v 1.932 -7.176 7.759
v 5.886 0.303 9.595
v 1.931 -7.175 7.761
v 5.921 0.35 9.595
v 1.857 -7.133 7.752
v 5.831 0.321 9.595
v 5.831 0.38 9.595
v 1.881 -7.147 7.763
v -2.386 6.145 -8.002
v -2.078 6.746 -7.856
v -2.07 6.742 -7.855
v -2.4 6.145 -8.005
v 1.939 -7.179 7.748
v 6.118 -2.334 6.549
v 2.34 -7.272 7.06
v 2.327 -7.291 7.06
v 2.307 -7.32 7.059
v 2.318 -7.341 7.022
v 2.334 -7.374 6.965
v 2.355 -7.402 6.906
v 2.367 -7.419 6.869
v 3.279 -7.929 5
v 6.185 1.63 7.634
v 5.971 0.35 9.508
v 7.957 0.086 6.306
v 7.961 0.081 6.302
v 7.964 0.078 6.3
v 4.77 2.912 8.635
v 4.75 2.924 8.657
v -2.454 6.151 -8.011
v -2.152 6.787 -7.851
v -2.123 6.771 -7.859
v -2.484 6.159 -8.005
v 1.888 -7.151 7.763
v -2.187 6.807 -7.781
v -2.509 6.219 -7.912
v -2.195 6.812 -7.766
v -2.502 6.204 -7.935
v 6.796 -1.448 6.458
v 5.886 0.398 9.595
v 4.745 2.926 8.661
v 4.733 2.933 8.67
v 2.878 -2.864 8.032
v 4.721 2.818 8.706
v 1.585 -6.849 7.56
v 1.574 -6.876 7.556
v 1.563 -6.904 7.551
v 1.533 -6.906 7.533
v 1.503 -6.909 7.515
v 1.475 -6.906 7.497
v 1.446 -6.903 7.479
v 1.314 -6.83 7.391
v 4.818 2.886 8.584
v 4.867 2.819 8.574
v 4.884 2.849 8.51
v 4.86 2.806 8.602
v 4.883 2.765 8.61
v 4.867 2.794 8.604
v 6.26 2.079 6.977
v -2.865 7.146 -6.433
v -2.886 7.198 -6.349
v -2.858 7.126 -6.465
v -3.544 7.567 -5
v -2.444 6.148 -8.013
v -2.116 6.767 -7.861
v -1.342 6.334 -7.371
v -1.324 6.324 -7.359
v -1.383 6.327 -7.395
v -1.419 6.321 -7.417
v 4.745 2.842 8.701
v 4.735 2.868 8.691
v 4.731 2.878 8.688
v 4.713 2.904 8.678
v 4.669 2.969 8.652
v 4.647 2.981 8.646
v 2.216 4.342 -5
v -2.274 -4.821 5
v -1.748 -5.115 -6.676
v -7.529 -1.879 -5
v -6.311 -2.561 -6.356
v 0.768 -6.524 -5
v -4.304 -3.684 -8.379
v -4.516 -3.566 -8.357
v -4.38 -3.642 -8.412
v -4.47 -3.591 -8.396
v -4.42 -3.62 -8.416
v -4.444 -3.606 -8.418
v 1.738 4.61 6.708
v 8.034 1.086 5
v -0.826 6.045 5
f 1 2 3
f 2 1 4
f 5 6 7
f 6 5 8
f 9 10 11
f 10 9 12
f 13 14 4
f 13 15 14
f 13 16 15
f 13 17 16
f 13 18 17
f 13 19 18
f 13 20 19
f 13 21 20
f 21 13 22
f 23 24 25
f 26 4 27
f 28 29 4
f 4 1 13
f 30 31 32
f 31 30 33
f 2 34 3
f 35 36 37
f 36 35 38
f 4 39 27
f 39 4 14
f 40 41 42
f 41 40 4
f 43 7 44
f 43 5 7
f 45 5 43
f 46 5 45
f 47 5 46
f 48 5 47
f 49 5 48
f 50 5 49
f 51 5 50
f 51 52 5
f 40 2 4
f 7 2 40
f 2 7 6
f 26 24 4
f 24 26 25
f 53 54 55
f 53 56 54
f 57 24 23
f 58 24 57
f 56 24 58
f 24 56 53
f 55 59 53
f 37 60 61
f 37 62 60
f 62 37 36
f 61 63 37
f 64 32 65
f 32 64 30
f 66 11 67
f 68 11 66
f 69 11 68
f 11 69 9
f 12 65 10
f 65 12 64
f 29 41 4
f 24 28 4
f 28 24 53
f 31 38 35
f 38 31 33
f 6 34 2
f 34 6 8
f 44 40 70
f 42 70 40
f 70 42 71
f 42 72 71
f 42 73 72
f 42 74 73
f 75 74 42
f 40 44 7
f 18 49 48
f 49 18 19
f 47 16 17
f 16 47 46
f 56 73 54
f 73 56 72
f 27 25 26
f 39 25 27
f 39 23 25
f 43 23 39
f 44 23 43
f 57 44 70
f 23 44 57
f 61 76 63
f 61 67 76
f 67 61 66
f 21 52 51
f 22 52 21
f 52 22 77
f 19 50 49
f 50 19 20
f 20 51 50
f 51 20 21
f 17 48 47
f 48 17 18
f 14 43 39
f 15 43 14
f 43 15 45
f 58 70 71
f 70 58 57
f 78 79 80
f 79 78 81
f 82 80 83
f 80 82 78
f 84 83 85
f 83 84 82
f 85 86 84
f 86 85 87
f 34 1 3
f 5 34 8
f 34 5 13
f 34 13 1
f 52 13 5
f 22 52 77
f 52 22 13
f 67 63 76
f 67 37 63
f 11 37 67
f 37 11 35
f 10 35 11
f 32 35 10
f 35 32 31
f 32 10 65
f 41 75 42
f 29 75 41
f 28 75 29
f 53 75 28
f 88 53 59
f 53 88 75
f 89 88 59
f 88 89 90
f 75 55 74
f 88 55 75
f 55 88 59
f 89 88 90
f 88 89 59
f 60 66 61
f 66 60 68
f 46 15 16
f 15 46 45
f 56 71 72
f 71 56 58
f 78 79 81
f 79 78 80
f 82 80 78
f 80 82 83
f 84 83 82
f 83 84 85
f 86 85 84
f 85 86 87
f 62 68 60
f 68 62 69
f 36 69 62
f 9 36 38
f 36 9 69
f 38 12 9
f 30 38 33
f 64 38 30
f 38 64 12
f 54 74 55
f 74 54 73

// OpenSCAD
// Auto-generated OpenSCAD file

    inner_points = 10*[[0.5272841921394986, -0.8941494324725834, -0.5000000000002047], [1.0157495787801158, -0.02156616077066012, -0.5000000000002183], [-0.9840743682826907, -0.048102565072366016, 0.5000000000002183], [-0.49560898164207345, 0.8244807066295572, 0.5000000000002047], [-0.22839508807181572, -0.47112599877236716, -0.9999999999999931], [0.5272841921397184, -0.8941494324726909, 0.4999999999997952], [0.2600702985688014, 0.401457272929556, -1.0000000000000067], [1.0157495787803354, -0.021566160770767534, 0.49999999999978156], [-0.9840743682829104, -0.0481025650722586, -0.49999999999978156], [-0.22839508807137623, -0.4711259987725822, 1.0000000000000067], [-0.4956089816422933, 0.8244807066296647, -0.4999999999997952], [0.26007029856924085, 0.4014572729293411, 0.9999999999999931], [-0.6705068091423759, 0.3493759475629592, -1.3623724356956024]];

    outer_points = 10*[[-0.5871016774818598, -0.035032029076049194, -0.9508335170979203], [-1.1127273597817333, 0.035032029076049194, -0.10300766831643143], [1.1127273597817333, -0.035032029076049194, 0.10300766831643143], [0.5871016774818598, 0.035032029076049194, 0.9508335170979203], [-0.1941165129402417, -0.8989291704166398, -0.6358027414048893], [-0.1301723233916815, 0.8288651122645414, -0.7389437000837753], [-0.7197421952401151, -0.8288651122645414, 0.21202310737659946], [-0.6557980056915549, 0.8989291704166398, 0.10888214869771351], [0.6557980056915549, -0.8989291704166398, -0.10888214869771351], [0.7197421952401151, 0.8288651122645414, -0.21202310737659946], [0.1301723233916815, -0.8288651122645414, 0.7389437000837753], [0.1941165129402417, 0.8989291704166398, 0.6358027414048893], [-0.05807720084257707, -1.5692662035184195, 0.09367759939690216]];

    // Convex hull for inner set (I)
    module inner_hull() {
        hull() {
            for (p = inner_points) {
                translate(p) sphere(r=0.1);
            }
        }
    }

    // Convex hull for outer set (O) minus inner hull (O \ I)
    module outer_minus_inner() {
        difference() {
            hull() {
                for (p = outer_points) {
                    translate(p) sphere(r=0.1);
                }
            }
            inner_hull(); // Subtract inner hull
        }
    }

    // Convex hull for outer set (O) minus all translated inner hulls
    module outer_minus_AllTranslationInner() {
        difference() {
            hull() {
                for (p = outer_points) {
                    translate(p) sphere(r=0.1);
                }
            }
            hull() {
                translate([0,0,50]) inner_hull();
                translate([0,0,-50]) inner_hull();
            }; // Subtract translated inner hulls
        }
    }

    // Difference between outer_minus_inner and outer_minus_AllTranslationInner
    module outer_minus_inner_diff() {
        difference() {
            // Outer minus inner
            difference() {
                hull() {
                    for (p = outer_points) {
                        translate(p) sphere(r=0.1);
                    }
                }
                inner_hull();
            }

            // Subtract Outer minus AllTranslationInner
            difference() {
                hull() {
                    for (p = outer_points) {
                        translate(p) sphere(r=0.1);
                    }
                }
                hull() {
                    translate([0,0,50]) inner_hull();
                    translate([0,0,-50]) inner_hull();
                };
            }
        }
    }

    // Rendering all with colors applied
    color([1, 1, 0, 1]) outer_minus_inner_diff(); // Opaque yellow
    
